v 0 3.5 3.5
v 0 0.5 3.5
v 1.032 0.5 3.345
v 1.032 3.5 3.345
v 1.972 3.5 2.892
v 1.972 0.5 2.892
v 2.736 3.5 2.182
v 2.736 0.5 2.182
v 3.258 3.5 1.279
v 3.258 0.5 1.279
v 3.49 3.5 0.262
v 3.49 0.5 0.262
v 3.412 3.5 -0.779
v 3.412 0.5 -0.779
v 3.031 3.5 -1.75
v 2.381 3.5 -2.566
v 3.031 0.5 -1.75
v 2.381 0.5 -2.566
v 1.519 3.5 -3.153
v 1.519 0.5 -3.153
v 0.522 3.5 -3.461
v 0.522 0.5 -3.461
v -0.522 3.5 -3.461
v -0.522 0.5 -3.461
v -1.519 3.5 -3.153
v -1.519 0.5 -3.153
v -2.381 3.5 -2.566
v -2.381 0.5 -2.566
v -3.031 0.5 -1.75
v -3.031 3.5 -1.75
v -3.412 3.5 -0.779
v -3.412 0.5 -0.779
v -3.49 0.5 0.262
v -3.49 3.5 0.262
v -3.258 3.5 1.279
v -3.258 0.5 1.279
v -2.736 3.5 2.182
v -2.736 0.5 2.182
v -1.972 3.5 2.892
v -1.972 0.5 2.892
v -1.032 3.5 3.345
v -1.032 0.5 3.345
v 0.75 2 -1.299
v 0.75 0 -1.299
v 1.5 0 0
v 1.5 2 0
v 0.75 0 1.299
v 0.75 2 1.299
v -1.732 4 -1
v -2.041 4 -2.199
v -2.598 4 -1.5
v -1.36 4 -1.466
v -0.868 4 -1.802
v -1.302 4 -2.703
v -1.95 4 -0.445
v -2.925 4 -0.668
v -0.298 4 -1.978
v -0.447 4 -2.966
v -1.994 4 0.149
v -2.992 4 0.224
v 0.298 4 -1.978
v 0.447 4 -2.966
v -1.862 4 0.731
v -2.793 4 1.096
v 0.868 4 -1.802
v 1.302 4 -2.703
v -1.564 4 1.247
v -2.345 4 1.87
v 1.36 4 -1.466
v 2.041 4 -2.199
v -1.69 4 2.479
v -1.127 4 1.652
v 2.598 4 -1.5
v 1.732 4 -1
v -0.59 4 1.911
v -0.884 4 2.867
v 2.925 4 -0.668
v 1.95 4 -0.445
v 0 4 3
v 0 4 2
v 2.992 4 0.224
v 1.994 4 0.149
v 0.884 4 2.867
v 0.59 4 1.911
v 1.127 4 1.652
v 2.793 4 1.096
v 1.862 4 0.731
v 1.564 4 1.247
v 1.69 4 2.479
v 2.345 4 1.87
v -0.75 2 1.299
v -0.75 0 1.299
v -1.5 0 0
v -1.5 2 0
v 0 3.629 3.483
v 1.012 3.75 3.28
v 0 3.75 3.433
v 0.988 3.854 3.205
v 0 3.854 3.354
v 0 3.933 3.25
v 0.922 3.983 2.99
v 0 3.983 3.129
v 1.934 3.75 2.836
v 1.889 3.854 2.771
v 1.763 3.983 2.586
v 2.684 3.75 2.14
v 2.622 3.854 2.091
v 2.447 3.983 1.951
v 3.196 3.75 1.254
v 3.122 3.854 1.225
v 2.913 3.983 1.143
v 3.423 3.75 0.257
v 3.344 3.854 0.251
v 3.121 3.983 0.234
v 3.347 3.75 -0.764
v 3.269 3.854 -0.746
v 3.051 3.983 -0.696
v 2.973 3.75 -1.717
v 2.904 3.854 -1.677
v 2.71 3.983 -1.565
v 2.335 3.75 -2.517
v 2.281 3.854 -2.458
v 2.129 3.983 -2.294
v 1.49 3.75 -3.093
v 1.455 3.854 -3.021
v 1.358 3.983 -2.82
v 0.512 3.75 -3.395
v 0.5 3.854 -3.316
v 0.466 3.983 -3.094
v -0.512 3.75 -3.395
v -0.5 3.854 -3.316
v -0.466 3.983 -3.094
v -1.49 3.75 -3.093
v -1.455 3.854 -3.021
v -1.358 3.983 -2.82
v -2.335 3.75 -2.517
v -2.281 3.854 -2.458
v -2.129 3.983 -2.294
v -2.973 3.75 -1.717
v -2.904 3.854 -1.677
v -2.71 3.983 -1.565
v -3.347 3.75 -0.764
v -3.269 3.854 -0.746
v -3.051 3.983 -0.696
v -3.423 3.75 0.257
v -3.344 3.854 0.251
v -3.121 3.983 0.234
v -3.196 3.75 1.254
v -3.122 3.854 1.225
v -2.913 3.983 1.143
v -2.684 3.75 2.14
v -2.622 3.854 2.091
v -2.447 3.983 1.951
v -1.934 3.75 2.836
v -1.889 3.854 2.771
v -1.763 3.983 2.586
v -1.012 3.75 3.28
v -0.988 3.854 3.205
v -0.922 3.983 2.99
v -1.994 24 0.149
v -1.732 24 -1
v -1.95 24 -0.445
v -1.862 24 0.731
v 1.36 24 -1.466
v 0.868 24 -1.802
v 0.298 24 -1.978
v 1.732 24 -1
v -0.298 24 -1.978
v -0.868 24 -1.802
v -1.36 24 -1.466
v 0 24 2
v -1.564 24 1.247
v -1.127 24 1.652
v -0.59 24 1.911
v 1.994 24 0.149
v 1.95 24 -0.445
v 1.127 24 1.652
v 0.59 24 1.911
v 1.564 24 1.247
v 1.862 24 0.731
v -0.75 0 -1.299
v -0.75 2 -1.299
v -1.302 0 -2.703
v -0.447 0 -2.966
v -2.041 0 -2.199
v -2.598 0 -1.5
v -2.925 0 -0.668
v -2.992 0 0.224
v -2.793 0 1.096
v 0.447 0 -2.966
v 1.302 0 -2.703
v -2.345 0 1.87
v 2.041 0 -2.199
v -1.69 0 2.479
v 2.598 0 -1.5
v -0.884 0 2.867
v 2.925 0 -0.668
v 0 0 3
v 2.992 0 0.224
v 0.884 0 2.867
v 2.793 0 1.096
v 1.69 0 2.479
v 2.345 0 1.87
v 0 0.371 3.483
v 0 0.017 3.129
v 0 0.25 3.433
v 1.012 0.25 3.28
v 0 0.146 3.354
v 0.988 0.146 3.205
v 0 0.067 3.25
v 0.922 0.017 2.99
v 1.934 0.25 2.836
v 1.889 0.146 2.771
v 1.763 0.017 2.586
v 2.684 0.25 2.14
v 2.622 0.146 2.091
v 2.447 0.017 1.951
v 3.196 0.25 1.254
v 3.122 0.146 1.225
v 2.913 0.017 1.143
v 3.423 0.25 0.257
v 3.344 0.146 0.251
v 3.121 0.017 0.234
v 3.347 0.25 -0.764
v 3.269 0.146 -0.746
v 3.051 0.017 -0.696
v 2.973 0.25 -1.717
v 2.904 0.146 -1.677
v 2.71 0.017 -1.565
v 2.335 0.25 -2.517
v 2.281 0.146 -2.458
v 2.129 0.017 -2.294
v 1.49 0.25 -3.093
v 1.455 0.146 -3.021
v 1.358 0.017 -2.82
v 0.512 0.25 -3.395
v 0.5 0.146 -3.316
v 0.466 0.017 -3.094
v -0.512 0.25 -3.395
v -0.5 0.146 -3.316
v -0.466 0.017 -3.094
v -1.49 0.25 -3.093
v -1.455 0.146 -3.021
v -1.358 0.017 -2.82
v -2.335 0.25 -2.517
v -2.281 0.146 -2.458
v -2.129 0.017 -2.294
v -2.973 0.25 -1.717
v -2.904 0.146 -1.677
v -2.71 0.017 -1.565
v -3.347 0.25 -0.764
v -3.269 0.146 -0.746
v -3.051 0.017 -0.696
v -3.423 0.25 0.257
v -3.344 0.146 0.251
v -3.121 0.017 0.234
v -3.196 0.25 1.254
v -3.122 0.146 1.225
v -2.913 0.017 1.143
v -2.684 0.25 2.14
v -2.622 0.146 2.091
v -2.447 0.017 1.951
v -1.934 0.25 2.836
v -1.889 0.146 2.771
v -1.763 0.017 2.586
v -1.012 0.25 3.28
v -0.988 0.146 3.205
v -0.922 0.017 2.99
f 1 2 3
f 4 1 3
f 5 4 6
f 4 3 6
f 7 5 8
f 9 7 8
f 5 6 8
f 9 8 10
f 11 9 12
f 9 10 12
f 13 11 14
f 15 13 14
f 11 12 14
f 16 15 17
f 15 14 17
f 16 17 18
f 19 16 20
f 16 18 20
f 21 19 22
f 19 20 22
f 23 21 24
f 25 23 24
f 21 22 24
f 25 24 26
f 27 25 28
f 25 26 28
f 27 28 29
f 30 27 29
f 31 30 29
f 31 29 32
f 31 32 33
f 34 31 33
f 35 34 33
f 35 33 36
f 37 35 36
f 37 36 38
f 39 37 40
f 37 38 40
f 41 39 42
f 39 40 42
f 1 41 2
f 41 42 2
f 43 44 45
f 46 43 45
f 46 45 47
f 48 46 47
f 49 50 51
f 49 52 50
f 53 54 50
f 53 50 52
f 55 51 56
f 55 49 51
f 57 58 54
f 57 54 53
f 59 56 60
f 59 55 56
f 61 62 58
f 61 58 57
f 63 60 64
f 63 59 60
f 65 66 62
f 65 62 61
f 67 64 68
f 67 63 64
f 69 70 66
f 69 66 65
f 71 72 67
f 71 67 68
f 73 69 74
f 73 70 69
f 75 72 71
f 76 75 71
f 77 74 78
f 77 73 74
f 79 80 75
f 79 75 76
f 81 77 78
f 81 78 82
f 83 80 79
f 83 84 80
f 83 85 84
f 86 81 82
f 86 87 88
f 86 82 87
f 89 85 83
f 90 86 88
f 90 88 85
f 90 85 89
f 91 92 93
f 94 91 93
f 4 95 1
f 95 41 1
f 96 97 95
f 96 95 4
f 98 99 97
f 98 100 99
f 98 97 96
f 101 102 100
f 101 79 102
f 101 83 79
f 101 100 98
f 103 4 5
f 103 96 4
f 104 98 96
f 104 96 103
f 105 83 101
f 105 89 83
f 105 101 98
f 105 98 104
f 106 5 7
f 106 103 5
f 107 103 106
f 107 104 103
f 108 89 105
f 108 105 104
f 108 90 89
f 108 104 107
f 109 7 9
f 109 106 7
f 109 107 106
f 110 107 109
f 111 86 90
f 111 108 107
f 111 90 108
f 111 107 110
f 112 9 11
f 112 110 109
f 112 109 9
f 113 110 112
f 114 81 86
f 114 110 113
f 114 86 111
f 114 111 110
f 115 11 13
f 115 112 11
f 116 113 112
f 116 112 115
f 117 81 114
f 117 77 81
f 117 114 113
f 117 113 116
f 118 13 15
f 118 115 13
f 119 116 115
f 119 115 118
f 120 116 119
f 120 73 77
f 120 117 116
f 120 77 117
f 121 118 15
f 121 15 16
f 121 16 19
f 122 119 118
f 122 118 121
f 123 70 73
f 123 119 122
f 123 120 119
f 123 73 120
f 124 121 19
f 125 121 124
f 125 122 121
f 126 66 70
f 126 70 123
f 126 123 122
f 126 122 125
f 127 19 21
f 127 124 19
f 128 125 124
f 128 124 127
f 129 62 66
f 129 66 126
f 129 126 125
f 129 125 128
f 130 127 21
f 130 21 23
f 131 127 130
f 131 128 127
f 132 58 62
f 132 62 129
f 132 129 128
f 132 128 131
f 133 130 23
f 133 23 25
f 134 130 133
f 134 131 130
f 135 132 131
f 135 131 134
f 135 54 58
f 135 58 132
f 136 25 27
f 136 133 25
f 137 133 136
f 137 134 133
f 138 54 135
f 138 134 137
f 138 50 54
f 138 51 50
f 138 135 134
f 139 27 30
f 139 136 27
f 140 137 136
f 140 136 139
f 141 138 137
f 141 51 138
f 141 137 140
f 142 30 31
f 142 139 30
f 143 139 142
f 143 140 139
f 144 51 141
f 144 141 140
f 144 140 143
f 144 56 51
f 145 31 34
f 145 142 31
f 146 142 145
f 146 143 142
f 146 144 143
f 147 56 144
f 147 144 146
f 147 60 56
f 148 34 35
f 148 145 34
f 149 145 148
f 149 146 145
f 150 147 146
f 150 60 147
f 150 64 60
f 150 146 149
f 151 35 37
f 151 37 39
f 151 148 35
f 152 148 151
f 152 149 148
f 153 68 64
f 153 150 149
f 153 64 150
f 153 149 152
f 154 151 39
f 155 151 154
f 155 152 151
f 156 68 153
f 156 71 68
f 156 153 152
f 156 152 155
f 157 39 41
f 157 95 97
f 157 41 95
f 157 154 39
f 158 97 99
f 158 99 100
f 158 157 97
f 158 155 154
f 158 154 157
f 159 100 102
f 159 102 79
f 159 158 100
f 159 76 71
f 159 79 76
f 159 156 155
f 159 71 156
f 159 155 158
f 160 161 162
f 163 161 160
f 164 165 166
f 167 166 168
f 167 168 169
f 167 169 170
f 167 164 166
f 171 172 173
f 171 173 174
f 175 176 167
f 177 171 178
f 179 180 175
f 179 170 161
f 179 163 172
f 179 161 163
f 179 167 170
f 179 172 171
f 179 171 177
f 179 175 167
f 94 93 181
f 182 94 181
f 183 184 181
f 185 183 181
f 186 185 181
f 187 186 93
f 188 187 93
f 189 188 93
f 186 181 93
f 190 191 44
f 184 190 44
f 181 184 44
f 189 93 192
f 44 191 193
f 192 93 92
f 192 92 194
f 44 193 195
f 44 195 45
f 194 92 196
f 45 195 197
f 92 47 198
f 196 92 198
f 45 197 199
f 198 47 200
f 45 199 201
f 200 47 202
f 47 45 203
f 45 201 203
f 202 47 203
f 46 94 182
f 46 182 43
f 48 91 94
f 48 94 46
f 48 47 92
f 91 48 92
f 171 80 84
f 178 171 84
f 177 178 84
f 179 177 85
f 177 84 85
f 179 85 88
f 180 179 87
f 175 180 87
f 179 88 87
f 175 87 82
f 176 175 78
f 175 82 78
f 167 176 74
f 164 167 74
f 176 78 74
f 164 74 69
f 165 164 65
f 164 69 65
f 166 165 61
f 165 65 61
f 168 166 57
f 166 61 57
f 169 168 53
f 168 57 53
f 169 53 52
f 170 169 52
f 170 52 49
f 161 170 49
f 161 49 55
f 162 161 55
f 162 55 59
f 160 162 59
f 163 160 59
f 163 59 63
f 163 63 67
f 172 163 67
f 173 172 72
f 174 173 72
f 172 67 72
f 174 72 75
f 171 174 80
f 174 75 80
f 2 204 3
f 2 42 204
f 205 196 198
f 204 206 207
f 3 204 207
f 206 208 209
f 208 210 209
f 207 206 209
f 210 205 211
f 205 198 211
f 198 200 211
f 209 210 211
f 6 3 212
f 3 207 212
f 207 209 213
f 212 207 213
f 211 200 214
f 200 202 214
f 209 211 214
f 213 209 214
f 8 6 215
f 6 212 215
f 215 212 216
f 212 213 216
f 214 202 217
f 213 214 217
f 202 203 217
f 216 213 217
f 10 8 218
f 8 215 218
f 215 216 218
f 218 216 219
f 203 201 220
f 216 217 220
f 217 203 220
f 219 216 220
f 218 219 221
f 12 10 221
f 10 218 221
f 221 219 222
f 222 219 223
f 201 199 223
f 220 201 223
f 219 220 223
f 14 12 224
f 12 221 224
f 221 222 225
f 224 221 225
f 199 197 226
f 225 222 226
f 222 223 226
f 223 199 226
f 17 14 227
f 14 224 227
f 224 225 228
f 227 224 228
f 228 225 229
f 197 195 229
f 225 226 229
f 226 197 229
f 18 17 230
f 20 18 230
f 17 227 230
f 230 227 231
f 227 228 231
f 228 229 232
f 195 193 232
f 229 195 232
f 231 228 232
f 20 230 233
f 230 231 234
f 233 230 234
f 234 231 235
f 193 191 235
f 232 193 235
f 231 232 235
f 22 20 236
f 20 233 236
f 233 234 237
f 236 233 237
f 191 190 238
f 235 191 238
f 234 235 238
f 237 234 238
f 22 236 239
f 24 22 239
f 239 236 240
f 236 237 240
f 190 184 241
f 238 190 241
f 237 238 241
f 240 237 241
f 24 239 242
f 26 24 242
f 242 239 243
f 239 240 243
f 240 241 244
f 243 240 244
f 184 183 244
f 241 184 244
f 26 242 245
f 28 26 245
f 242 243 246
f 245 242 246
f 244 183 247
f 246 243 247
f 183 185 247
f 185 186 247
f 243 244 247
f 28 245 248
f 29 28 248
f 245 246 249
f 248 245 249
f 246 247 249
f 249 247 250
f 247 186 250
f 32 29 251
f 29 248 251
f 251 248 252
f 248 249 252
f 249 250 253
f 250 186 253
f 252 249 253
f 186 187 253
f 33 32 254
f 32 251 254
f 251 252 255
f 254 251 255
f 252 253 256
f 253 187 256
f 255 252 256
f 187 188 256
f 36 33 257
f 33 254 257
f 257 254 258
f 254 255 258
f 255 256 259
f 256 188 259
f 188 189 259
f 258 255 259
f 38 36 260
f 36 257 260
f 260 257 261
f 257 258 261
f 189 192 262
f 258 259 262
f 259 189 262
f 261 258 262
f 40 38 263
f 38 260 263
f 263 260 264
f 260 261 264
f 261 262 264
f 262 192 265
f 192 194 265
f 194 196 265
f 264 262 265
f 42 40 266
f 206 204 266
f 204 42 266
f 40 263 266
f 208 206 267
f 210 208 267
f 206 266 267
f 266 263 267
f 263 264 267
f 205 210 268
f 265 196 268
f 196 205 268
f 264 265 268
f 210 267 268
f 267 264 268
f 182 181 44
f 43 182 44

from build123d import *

# Parameters (mm, degrees)
SKETCH_1_R          = 3.5
EXTRUDE_1_DEPTH     = 4
SKETCH_2_R          = 2
EXTRUDE_2_DEPTH     = 20
CUT_EXTRUDE_1_DEPTH = 2
FILLET_1_R          = 0.5


with BuildPart() as part:
    # 草图1 → 凸台-拉伸1 (new body)
    with BuildSketch(Plane(origin=(0, 0, 0), x_dir=(1, 0, 0), z_dir=(0, 1, 0))):
        with Locations(Location((0, 0, 0), (0, 0, 270))):
            Circle(SKETCH_1_R)
    extrude(amount=EXTRUDE_1_DEPTH)

    # 草图2 → 凸台-拉伸2 (add)
    with BuildSketch(Plane(origin=(0, 4, 0), x_dir=(1, 0, 0), z_dir=(0, 1, 0))):
        with Locations(Location((0, 0, 0), (0, 0, 270))):
            Circle(SKETCH_2_R)
    extrude(amount=EXTRUDE_2_DEPTH)

    # 草图3 → 切除-拉伸1 (cut)
    with BuildSketch(Plane.XZ):
        Polygon((1.5, 0), (0.75, 1.299038106), (-0.75, 1.299038106), (-1.5, 0), (-0.75, -1.299038106), (0.75, -1.299038106), align=None)
    extrude(amount=-CUT_EXTRUDE_1_DEPTH, mode=Mode.SUBTRACT)

    # 圆角1
    fillet_1_edges = [part.edges().sort_by_distance(p)[0] for p in [
        (0, 0, -3.5),
        (0, 4, -3.5),
    ]]
    fillet(fillet_1_edges, radius=FILLET_1_R)


solid = part.part
